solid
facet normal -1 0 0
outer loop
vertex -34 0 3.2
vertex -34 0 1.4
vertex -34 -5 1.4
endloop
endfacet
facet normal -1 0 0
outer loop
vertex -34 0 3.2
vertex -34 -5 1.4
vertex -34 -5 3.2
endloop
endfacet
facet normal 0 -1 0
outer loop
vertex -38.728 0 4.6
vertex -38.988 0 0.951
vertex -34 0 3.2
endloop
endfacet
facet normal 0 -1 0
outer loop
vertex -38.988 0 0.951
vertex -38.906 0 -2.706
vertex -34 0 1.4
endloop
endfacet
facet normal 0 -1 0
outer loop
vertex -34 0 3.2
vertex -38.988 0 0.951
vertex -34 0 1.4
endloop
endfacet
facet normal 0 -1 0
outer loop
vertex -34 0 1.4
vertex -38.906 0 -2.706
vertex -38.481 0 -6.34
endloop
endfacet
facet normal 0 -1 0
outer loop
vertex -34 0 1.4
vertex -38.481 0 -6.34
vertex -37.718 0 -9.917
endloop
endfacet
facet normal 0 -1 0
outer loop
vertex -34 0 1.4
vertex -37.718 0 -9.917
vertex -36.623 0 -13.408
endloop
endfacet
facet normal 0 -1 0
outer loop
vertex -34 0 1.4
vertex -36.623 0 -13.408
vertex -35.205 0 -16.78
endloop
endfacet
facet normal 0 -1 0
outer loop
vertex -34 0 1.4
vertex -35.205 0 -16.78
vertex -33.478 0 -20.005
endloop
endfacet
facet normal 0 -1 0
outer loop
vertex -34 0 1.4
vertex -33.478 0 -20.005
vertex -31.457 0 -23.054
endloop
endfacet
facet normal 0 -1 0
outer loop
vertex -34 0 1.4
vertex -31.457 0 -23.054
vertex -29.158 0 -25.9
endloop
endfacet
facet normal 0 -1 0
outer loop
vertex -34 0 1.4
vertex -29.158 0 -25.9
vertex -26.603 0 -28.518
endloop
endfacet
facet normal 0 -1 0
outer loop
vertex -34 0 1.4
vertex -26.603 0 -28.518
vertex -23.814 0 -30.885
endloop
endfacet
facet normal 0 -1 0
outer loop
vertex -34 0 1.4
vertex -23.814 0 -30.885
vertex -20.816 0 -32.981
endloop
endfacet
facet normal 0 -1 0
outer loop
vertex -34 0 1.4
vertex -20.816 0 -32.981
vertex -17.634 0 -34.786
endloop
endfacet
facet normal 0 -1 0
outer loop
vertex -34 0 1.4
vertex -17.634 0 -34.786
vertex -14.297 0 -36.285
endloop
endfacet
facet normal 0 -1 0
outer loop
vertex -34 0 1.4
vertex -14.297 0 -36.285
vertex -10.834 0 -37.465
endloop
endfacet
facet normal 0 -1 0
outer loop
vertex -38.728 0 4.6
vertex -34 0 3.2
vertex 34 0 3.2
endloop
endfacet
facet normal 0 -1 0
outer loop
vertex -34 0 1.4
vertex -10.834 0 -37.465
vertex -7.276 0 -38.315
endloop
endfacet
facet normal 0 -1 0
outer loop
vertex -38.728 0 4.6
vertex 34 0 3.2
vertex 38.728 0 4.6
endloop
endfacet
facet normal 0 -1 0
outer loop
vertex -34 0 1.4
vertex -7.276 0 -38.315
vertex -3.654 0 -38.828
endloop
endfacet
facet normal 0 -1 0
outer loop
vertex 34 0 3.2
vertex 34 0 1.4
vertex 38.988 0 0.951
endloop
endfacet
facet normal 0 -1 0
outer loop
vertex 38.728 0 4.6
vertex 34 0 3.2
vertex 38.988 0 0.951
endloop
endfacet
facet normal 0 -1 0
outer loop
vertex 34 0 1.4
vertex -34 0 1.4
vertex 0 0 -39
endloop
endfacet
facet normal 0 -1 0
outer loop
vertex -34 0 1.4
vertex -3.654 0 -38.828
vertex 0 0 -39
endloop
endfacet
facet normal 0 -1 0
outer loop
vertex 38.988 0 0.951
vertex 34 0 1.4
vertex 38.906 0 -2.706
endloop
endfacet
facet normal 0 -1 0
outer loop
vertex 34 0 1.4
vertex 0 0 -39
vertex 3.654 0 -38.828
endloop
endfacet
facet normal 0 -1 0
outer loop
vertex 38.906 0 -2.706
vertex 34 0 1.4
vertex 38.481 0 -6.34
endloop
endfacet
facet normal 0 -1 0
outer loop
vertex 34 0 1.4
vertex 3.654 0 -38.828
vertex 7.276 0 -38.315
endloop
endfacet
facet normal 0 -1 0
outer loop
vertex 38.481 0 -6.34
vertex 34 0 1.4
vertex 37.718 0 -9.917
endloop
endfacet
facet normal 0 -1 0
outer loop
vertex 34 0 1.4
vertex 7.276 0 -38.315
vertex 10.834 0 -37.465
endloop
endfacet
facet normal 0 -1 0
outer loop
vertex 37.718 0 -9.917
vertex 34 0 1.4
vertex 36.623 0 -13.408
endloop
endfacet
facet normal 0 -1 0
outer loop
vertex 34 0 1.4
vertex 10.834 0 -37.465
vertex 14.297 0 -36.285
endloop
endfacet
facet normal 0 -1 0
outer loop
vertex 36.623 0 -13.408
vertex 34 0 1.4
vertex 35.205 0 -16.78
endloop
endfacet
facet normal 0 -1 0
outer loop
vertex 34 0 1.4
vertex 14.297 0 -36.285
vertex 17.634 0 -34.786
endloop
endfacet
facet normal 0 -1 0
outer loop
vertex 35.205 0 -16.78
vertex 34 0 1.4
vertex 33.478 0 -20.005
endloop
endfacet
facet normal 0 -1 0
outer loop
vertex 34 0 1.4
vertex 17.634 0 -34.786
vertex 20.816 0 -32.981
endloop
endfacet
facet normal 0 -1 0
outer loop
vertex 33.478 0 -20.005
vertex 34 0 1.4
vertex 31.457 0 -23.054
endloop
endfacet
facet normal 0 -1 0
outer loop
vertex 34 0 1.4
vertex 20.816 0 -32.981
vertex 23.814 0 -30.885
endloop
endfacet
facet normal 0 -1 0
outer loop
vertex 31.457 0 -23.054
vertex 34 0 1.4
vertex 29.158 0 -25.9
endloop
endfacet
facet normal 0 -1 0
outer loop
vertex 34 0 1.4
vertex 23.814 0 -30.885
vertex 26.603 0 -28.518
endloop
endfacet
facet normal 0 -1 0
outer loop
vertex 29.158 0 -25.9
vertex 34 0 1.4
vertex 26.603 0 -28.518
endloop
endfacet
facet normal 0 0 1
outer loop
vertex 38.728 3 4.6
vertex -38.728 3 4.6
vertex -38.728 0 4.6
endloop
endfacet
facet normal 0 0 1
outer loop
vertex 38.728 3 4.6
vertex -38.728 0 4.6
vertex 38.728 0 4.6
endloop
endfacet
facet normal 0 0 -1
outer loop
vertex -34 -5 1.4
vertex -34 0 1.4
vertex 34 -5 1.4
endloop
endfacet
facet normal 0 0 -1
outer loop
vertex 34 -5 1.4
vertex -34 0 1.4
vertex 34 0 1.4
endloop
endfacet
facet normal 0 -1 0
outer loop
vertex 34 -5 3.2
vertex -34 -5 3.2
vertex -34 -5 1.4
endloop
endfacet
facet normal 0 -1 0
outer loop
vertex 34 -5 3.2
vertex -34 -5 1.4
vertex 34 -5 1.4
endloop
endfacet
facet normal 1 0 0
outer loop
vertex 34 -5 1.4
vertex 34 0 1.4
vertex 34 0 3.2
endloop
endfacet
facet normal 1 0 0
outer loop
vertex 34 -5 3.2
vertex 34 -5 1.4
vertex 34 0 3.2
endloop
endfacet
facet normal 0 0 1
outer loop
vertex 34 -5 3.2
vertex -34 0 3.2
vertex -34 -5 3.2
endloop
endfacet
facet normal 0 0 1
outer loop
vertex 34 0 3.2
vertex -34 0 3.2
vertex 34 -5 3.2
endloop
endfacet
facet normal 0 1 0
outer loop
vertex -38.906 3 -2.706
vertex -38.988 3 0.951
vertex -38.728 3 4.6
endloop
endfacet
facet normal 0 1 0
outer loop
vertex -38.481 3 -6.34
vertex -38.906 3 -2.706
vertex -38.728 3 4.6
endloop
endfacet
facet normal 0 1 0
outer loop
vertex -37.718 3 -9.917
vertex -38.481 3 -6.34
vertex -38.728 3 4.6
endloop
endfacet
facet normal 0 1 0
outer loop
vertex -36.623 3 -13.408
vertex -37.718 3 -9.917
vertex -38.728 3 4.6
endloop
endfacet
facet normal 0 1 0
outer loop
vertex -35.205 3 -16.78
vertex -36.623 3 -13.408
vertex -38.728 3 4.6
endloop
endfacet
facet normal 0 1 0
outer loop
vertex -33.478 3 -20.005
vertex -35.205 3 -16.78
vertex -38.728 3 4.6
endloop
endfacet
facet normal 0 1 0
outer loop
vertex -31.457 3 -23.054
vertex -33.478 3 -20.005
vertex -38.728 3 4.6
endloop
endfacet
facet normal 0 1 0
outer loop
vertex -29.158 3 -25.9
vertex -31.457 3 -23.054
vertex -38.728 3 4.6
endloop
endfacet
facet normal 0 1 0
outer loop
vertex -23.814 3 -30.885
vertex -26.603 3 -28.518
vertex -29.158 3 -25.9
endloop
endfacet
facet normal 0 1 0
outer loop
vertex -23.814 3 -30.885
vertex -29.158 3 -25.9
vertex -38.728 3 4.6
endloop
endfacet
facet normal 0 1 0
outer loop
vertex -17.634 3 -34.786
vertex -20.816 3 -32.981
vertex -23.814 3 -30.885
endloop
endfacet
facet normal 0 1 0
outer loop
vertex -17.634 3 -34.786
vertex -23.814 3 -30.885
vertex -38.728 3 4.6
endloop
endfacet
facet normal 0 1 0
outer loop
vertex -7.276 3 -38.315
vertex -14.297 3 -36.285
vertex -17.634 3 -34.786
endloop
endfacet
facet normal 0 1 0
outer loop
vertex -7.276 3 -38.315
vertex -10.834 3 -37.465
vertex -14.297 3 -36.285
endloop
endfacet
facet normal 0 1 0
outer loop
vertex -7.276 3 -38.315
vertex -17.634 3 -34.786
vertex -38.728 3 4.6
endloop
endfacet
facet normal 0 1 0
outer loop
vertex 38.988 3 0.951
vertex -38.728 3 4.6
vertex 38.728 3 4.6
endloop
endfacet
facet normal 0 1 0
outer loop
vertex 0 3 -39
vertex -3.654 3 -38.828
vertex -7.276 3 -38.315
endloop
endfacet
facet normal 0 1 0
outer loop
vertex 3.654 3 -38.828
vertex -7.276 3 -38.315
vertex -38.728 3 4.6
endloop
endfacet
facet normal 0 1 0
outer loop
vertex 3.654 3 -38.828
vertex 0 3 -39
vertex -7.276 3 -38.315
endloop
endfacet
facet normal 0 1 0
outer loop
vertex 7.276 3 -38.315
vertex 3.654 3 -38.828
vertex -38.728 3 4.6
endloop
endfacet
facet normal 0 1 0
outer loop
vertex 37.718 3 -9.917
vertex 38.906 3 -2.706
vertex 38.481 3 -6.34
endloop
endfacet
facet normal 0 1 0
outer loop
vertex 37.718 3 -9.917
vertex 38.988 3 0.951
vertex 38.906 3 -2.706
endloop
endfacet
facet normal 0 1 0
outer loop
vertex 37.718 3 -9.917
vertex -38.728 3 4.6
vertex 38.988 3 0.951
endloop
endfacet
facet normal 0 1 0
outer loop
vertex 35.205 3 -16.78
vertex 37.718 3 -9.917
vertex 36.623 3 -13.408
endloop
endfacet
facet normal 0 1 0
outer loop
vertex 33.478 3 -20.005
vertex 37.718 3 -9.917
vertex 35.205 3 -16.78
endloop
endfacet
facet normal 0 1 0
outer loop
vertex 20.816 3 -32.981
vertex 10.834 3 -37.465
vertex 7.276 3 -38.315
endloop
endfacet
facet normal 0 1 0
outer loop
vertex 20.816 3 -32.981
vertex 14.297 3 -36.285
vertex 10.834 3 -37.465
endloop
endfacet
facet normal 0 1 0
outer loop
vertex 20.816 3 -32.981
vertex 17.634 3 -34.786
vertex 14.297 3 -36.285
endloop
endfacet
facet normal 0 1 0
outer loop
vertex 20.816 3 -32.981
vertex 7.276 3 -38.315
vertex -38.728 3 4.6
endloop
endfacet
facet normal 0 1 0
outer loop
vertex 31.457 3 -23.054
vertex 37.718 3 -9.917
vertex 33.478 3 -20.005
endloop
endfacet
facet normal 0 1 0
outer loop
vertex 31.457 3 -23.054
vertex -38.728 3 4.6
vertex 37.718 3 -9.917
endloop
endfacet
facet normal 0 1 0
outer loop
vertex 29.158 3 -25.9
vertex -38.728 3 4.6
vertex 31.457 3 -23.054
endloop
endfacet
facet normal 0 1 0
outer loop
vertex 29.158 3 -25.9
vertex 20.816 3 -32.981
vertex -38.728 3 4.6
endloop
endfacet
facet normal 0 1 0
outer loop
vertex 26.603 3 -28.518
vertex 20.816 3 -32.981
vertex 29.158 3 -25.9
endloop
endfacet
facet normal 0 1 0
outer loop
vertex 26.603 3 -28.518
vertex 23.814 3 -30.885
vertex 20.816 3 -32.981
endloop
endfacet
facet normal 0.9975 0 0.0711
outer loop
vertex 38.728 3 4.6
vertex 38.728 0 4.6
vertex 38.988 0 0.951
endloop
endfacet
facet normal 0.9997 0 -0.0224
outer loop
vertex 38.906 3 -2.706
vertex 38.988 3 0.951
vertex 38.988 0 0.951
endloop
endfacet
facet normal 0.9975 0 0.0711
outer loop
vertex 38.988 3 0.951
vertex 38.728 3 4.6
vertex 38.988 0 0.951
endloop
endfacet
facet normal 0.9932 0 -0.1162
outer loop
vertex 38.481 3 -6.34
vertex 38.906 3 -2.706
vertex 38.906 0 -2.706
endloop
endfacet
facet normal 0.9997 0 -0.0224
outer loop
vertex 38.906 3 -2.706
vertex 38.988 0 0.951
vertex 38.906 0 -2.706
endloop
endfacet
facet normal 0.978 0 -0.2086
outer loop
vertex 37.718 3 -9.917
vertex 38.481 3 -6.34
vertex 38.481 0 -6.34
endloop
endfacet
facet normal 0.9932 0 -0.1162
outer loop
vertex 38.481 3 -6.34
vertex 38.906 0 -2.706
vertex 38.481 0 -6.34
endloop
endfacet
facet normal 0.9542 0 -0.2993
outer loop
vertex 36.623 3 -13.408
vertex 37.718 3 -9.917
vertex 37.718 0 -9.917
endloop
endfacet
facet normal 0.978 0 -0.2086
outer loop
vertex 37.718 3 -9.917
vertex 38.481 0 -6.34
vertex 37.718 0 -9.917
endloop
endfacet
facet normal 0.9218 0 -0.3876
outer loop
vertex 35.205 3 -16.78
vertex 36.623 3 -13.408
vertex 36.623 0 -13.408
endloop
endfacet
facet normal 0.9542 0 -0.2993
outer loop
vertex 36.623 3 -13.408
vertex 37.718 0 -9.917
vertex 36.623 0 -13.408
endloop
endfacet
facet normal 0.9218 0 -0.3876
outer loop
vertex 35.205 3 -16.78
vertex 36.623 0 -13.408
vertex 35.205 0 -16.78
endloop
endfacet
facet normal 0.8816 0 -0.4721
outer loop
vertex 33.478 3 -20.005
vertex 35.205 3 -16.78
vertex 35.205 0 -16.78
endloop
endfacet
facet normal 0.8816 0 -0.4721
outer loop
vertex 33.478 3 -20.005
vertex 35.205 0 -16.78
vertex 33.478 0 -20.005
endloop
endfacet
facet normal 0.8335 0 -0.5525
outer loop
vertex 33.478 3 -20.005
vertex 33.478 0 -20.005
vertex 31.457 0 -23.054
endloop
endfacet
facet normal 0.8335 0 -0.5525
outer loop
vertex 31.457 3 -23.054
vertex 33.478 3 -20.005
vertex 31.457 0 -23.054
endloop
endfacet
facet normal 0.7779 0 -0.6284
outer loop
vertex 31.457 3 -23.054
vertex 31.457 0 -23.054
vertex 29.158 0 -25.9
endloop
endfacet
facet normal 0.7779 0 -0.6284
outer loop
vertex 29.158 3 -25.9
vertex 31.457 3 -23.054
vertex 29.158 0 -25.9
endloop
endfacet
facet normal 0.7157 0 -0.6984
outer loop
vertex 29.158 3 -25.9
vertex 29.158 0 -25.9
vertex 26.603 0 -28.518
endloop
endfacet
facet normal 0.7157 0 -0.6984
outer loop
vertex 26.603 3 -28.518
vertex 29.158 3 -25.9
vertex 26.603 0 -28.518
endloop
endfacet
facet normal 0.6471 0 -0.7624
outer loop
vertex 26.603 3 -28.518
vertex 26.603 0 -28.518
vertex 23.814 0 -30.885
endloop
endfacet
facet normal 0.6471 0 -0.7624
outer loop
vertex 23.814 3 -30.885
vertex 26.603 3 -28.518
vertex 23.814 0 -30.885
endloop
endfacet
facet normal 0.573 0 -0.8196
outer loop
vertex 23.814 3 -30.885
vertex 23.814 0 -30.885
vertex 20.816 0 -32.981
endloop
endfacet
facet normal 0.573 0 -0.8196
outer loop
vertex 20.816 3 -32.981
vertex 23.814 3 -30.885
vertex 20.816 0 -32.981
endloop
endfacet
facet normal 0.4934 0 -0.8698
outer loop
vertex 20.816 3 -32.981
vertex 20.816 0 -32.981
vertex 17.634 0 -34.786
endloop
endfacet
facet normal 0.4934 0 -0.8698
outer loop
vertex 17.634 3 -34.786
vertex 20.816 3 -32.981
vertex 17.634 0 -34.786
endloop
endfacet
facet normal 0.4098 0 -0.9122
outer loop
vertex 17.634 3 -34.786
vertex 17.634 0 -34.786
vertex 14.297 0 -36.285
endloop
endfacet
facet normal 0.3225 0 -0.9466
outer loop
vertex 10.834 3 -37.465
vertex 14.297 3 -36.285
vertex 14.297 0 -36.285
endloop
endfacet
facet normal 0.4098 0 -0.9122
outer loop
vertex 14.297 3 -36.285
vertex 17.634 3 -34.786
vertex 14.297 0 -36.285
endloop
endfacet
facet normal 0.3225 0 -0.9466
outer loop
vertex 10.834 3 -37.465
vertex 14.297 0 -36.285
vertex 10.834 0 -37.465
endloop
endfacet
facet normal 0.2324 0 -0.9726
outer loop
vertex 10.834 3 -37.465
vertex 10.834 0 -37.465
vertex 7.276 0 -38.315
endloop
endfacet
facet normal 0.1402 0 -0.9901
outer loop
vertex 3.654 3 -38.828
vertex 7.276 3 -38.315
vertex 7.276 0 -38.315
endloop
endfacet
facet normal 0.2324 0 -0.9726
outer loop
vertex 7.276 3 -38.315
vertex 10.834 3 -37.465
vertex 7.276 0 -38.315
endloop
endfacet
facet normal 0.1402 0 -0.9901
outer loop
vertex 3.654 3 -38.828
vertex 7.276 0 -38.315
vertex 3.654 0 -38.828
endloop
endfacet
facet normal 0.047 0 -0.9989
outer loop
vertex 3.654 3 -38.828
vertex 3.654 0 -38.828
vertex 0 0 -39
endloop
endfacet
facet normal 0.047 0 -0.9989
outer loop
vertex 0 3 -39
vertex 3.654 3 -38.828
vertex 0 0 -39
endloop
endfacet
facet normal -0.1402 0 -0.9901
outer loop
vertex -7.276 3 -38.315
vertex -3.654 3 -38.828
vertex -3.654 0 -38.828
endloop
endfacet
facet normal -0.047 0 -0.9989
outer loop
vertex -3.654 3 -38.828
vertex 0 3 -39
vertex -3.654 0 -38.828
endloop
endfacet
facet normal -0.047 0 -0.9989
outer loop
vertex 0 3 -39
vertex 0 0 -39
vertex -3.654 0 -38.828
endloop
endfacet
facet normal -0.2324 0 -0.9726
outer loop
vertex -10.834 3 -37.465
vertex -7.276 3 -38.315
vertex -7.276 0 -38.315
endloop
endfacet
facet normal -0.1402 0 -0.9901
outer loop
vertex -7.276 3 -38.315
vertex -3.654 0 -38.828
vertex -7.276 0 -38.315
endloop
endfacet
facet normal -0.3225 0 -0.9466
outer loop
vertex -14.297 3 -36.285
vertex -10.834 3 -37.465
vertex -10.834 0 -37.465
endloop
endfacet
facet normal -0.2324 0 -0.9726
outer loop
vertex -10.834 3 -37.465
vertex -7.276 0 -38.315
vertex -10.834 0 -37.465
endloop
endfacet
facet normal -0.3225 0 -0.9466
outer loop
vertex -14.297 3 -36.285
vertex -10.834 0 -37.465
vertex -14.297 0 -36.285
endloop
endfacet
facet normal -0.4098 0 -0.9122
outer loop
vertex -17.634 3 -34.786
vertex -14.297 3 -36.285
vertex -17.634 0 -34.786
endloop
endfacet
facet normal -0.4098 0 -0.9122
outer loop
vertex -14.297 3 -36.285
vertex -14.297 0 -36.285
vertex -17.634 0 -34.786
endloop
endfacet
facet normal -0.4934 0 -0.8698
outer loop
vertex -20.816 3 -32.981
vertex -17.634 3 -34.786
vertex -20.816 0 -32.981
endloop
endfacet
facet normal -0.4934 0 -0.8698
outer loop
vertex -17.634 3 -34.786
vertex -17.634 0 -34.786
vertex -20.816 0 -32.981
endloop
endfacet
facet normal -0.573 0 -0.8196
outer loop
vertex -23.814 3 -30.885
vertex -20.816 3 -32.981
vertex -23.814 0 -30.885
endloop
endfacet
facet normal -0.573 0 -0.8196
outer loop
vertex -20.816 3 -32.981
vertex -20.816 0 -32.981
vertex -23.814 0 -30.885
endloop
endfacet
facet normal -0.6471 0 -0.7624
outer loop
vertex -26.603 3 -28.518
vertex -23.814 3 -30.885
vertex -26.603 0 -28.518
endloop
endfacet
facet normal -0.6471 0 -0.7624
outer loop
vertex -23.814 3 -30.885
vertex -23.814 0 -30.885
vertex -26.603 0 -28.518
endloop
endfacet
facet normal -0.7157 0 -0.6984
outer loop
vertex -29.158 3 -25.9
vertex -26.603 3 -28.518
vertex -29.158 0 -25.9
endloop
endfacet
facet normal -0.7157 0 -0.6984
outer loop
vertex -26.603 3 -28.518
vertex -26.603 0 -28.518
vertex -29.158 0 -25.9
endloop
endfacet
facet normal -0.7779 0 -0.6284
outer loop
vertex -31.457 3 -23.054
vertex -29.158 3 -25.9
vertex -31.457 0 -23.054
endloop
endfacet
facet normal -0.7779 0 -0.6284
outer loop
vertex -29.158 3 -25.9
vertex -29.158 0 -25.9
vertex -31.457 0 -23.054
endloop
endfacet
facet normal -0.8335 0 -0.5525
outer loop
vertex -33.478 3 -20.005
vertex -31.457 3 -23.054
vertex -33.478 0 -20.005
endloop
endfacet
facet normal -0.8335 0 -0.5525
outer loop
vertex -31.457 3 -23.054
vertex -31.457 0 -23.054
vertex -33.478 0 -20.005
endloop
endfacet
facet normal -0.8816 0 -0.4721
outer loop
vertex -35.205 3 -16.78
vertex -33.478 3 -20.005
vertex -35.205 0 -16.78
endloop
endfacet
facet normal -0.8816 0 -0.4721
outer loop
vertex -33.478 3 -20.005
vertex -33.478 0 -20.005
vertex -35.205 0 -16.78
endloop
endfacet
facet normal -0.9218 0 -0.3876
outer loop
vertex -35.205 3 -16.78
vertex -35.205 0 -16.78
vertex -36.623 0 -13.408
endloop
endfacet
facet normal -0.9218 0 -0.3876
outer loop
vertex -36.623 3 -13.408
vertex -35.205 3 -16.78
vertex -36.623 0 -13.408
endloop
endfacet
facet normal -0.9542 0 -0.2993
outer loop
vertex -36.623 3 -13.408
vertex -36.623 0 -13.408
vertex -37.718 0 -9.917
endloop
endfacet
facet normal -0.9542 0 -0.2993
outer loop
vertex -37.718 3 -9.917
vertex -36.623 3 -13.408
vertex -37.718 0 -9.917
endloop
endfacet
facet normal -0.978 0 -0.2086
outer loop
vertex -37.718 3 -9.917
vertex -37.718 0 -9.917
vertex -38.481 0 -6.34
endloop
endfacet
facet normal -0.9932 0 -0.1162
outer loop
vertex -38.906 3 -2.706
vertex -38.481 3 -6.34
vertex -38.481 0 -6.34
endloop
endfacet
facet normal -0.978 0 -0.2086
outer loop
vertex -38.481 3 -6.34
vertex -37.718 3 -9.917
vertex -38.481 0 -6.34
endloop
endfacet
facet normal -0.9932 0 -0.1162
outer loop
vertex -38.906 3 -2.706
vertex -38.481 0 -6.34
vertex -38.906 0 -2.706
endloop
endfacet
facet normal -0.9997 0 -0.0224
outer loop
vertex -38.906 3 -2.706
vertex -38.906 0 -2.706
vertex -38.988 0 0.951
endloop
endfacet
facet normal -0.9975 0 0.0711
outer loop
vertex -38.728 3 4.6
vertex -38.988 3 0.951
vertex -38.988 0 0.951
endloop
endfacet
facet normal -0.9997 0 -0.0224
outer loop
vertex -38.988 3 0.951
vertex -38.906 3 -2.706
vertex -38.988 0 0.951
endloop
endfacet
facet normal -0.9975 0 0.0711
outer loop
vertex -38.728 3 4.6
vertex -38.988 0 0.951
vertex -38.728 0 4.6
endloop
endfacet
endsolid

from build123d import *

# Parameters (mm, degrees)
SKETCH1_R           = 39
BOSS_EXTRUDE1_DEPTH = 3
SKETCH3_W           = 110.988465814
SKETCH3_H           = 40.72920708
CUT_EXTRUDE1_DEPTH  = 3
SKETCH4_W           = 68
SKETCH4_H           = 1.8
BOSS_EXTRUDE2_DEPTH = 5
SKETCH4_2_W         = 68
SKETCH4_2_H         = 1.8
BOSS_EXTRUDE3_DEPTH = 5


with BuildPart() as part:
    # Sketch1 → Boss-Extrude1 (new body)
    with BuildSketch(Plane(origin=(0, 0, 0), x_dir=(1, 0, 0), z_dir=(0, 1, 0))):
        Circle(SKETCH1_R)
    extrude(amount=BOSS_EXTRUDE1_DEPTH)

    # Sketch3 → Cut-Extrude1 (cut)
    with BuildSketch(Plane(origin=(0, 3, 0), x_dir=(1, 0, 0), z_dir=(0, 1, 0))):
        with Locations((0.606471885, -24.96460354)):
            Rectangle(SKETCH3_W, SKETCH3_H)
    extrude(amount=-CUT_EXTRUDE1_DEPTH, mode=Mode.SUBTRACT)

    # Sketch4 → Boss-Extrude2 (add)
    with BuildSketch(Plane.XZ):
        with Locations((0, 2.3)):
            Rectangle(SKETCH4_W, SKETCH4_H)
    extrude(amount=BOSS_EXTRUDE2_DEPTH)

    # Sketch4<2> → Boss-Extrude3 (add)
    with BuildSketch(Plane.XZ):
        with Locations((0, 2.3)):
            Rectangle(SKETCH4_2_W, SKETCH4_2_H)
    extrude(amount=BOSS_EXTRUDE3_DEPTH)


solid = part.part
